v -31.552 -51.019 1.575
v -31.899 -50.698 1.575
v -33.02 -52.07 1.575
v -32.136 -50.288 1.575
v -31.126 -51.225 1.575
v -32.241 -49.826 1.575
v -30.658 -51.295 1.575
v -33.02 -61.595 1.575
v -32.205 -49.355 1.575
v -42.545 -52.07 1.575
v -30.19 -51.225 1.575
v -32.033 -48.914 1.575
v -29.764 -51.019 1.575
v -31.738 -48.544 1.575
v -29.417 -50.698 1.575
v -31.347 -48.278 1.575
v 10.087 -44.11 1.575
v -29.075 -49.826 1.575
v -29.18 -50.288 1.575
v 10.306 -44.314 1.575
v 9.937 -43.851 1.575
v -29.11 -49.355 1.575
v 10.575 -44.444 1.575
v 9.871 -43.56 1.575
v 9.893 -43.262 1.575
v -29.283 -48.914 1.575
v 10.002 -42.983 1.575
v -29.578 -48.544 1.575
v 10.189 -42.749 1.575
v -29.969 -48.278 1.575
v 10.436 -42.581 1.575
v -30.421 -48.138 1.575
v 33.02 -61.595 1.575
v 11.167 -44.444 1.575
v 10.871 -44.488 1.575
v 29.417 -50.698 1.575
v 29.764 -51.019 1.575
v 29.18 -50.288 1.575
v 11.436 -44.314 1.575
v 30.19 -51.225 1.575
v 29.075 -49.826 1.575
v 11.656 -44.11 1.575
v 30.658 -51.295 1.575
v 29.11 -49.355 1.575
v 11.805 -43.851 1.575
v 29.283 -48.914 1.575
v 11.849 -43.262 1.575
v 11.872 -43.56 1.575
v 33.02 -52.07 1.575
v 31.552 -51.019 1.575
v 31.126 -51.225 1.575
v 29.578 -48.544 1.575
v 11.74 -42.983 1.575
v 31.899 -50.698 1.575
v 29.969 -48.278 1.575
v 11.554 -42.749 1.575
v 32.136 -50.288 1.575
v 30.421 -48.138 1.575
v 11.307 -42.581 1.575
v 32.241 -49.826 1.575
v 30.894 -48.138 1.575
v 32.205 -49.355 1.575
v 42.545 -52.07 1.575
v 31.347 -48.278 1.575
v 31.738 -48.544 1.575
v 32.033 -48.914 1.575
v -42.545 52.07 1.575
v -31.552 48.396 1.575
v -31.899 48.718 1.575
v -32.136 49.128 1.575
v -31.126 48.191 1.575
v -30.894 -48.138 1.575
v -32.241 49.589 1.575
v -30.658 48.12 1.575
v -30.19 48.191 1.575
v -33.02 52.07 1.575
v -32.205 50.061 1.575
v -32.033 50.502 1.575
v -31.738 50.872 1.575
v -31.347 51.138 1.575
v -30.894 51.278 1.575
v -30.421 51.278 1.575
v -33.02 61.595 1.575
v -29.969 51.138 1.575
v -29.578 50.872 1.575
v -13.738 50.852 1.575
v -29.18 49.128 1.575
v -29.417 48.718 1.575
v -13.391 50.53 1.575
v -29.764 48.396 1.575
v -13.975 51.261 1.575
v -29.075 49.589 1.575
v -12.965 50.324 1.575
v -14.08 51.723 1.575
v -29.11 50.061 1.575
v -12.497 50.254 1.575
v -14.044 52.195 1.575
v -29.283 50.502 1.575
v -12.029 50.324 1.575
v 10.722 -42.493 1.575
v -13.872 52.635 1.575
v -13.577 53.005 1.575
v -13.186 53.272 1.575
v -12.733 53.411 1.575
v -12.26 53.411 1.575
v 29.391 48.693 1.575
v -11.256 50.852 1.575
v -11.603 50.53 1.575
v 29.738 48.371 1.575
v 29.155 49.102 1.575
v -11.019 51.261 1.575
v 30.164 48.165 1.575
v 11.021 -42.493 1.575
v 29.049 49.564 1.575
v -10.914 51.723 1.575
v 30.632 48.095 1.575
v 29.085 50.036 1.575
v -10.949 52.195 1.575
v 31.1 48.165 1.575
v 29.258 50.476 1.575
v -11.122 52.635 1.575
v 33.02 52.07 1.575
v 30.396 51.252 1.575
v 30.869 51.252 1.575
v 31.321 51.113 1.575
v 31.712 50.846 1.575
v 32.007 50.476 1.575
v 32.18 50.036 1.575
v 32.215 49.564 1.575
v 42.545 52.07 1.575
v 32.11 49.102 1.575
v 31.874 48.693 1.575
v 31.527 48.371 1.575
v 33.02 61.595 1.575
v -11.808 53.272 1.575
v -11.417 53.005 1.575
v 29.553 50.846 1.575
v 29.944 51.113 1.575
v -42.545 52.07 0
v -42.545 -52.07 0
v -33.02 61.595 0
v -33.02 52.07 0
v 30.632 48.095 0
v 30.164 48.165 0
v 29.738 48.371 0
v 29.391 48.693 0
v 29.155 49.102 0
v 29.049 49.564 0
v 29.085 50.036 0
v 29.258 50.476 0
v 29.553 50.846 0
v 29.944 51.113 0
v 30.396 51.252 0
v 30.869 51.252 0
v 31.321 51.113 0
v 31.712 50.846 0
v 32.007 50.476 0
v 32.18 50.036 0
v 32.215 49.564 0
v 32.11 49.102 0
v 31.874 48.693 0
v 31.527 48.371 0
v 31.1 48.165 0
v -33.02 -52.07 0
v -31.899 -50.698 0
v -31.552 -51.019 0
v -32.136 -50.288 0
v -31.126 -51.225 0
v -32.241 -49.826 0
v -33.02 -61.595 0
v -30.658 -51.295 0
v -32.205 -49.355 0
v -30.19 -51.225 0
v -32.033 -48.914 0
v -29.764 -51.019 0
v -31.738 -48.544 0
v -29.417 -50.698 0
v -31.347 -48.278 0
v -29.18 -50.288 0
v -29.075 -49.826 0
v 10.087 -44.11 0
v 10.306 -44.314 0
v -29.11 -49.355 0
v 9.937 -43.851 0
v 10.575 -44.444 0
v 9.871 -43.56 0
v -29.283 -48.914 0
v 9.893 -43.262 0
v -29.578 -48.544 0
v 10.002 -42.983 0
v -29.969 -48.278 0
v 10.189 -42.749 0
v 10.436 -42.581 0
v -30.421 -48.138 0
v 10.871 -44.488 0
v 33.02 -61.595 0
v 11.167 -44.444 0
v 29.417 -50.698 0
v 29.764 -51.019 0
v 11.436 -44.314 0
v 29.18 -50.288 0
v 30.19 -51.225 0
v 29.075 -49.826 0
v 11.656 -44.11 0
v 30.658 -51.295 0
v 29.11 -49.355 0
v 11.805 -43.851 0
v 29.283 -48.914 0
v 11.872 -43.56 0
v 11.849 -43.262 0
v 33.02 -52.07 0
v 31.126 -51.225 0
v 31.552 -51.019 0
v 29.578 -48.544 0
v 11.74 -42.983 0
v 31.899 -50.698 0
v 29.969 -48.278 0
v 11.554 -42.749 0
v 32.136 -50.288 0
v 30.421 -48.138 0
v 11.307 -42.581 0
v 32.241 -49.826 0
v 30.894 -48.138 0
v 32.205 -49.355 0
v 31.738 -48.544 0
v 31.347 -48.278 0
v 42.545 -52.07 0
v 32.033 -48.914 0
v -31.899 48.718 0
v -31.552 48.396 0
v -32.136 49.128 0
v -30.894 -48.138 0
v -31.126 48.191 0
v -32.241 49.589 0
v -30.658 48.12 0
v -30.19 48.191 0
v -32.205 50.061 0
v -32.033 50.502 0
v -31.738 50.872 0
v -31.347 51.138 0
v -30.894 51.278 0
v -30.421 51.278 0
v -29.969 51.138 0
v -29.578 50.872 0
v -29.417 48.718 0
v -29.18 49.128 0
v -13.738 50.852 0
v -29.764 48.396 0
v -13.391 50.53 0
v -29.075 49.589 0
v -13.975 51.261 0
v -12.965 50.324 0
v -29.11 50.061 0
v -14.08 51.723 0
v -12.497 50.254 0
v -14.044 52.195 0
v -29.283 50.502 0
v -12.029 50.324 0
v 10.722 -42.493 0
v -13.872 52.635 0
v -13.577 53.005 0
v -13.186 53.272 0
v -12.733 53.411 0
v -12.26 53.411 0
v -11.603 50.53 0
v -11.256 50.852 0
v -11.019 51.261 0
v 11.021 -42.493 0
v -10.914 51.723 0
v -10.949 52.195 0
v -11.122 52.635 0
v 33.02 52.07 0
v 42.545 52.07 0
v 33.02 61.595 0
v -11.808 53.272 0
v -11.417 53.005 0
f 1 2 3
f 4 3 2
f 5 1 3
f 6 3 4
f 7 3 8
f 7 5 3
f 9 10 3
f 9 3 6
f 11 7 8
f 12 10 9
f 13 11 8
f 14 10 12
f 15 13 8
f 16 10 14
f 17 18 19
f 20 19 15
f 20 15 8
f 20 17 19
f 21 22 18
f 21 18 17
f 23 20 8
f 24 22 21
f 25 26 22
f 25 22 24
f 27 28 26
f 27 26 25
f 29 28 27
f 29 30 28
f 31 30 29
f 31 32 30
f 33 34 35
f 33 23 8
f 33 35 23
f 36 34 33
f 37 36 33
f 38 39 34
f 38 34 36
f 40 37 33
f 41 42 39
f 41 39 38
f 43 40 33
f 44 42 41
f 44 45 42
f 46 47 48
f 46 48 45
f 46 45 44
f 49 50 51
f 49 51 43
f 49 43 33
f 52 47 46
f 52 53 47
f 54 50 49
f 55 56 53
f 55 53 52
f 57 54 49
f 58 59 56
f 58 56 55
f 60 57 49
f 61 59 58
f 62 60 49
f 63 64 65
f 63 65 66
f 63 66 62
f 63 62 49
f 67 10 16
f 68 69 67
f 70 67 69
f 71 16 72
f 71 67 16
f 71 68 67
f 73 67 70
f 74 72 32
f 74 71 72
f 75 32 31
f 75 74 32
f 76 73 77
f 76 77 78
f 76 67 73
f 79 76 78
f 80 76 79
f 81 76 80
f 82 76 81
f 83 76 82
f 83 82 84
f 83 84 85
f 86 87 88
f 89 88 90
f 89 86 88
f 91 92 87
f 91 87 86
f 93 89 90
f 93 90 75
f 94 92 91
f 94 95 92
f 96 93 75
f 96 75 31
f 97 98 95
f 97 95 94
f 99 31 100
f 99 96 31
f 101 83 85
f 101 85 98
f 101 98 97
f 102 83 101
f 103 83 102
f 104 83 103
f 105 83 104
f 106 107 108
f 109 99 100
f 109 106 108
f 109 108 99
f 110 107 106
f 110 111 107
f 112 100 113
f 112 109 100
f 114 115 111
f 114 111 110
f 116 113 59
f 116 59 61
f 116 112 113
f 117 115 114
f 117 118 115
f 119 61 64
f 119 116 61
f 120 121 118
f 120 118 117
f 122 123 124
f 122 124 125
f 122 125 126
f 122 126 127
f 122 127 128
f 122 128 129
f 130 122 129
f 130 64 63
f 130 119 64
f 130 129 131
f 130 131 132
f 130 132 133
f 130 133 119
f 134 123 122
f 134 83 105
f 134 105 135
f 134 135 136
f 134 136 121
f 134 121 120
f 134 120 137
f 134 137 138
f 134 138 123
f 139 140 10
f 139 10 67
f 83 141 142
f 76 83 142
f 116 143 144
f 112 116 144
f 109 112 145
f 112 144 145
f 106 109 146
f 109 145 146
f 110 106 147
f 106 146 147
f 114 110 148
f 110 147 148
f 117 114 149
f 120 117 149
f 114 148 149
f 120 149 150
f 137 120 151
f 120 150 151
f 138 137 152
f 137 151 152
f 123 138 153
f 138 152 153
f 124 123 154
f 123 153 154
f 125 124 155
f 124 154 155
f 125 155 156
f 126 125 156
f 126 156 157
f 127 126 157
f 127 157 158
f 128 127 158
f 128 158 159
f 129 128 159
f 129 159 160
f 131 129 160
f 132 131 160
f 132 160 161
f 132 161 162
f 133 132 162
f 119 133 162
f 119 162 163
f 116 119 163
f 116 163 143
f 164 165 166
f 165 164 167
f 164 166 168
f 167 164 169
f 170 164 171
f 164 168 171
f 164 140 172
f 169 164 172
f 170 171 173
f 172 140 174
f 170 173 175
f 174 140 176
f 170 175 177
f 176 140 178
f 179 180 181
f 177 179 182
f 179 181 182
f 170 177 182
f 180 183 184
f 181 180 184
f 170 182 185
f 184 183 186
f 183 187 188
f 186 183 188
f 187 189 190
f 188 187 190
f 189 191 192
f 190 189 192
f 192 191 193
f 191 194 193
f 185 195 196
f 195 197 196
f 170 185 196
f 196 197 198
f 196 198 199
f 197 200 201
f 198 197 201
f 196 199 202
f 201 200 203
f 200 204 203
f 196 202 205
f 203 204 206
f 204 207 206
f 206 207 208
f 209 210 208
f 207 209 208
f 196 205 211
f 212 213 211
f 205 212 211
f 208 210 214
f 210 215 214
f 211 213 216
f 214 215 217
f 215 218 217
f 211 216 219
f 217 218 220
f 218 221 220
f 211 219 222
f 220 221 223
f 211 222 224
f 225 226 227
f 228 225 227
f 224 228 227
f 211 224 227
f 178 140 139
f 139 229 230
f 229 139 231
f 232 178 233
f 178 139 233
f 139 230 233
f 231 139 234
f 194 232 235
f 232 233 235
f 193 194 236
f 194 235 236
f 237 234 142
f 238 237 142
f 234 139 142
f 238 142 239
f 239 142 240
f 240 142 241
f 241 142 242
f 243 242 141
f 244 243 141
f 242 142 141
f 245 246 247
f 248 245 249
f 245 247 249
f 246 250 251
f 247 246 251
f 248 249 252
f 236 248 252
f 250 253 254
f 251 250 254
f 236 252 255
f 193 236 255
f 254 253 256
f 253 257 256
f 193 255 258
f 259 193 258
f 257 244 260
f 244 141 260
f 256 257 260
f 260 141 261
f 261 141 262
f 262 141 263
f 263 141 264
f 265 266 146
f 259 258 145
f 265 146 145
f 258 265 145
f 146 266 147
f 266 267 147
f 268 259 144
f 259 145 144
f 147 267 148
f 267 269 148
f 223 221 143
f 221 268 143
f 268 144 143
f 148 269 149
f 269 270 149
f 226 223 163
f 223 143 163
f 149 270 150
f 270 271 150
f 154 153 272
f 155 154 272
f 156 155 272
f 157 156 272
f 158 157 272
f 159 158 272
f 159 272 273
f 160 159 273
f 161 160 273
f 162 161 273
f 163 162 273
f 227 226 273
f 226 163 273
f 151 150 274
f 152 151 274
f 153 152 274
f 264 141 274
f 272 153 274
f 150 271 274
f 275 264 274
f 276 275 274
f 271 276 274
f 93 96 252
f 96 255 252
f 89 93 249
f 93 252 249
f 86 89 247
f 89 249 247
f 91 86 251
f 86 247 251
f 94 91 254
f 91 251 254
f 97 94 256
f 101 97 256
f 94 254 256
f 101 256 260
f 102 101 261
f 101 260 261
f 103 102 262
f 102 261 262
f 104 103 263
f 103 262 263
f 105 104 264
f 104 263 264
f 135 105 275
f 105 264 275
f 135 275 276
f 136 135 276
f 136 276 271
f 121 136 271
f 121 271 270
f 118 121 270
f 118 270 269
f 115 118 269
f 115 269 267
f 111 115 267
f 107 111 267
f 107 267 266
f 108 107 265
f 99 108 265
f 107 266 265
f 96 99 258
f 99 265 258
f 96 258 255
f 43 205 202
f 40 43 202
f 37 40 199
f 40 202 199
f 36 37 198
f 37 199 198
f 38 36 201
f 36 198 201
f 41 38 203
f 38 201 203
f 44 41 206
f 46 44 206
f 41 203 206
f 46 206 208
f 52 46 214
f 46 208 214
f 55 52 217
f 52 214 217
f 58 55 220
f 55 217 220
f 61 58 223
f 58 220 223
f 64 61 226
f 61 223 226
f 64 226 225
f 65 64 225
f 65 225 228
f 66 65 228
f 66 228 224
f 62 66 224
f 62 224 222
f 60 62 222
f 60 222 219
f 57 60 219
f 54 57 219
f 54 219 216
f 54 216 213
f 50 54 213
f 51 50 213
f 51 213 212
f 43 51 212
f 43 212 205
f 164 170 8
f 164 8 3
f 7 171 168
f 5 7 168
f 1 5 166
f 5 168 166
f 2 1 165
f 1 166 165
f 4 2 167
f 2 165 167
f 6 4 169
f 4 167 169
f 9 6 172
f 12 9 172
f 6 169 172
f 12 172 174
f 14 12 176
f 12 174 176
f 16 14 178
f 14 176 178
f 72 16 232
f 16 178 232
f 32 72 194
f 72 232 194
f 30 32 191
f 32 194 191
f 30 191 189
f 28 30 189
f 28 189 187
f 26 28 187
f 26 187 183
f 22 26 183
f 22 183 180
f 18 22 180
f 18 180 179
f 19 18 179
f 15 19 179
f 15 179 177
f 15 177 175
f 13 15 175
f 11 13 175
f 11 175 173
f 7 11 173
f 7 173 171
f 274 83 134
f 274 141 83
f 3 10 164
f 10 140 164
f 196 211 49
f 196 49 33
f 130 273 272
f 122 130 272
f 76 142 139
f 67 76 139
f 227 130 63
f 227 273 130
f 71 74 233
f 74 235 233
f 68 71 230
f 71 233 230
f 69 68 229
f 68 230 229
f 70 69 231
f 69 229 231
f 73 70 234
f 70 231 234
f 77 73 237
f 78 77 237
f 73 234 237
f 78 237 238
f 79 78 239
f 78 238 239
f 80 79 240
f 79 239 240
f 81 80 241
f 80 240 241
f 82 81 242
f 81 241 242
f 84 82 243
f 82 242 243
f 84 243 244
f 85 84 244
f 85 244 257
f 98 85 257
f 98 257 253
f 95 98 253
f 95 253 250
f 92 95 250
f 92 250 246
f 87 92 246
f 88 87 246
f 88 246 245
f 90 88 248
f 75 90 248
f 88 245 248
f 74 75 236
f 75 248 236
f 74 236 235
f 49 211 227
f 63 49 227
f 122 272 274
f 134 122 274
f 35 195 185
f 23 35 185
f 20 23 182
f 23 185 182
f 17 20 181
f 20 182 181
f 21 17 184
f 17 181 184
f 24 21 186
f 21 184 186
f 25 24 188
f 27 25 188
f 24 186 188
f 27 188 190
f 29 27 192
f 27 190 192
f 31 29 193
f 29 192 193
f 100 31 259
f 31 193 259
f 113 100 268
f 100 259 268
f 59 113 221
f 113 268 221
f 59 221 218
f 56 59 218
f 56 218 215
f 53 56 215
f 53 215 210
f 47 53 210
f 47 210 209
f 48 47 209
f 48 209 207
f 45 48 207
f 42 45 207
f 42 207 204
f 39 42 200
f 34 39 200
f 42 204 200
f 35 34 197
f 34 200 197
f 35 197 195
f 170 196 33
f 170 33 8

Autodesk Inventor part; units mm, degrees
ref_plane "YZ Plane" through (0, 0, 0) normal (1, 0, 0) x (0, 1, 0)
ref_plane "XZ Plane" through (0, 0, 0) normal (0, 1, 0) x (-1, 0, 0)
ref_plane "XY Plane" through (0, 0, 0) normal (0, 0, 1) x (1, 0, 0)
sketch "Sketch1" plane through (0, 0, 0) normal (0, 0, 1) x (1, 0, 0)
  line L0 (-33.02, 52.07) -> (33.02, 52.07)
  line L1 (33.02, 52.07) -> (33.02, -52.07)
  line L2 (33.02, -52.07) -> (-33.02, -52.07)
  line L3 (-33.02, -52.07) -> (-33.02, 52.07)
  line L4 (-42.545, 61.595) -> (42.545, 61.595)
  line L5 (42.545, 61.595) -> (42.545, -61.595)
  line L6 (42.545, -61.595) -> (-42.545, -61.595)
  line L7 (-42.545, -61.595) -> (-42.545, 61.595)
  line L8 (-33.02, 52.07) -> (33.02, 52.07)
  line L9 (33.02, 52.07) -> (33.02, 61.595)
  line L10 (33.02, 61.595) -> (-33.02, 61.595)
  line L11 (-33.02, 61.595) -> (-33.02, 52.07)
  line L12 (-33.02, 52.07) -> (-42.545, 52.07)
  line L13 (-42.545, 52.07) -> (-42.545, -52.07)
  line L14 (-42.545, -52.07) -> (-33.02, -52.07)
  line L15 (-33.02, -52.07) -> (-33.02, 52.07)
  line L16 (33.02, -52.07) -> (42.545, -52.07)
  line L17 (42.545, -52.07) -> (42.545, 52.07)
  line L18 (42.545, 52.07) -> (33.02, 52.07)
  line L19 (33.02, 52.07) -> (33.02, -52.07)
  line L20 (-33.02, -52.07) -> (33.02, -52.07)
  line L21 (33.02, -52.07) -> (33.02, -61.595)
  line L22 (33.02, -61.595) -> (-33.02, -61.595)
  line L23 (-33.02, -61.595) -> (-33.02, -52.07)
  point P0 (0, 0)
  dimension "d0" = 104.14
  dimension "d1" = 123.19
  dimension "d2" = 66.04
  dimension "d3" = 85.09
  dimension "d4" = 52.07
  dimension "d5" = 33.02
  dimension "d6" = 61.595
  dimension "d7" = 42.545
extrude "Extrusion1" add sketch "Sketch1" along normal blind 1.5748 contours L11 L4 L9 L0 | L0 L1 L2 L3 | L3 L14 L7 L12 | L18 L5 L16 L1 | L2 L21 L6 L23
hole "Hole1" at (30.6324, 49.6824, 1.5748) direction (0, 0, -1) diameter 3.175 end through all
hole "Hole2" at (-30.6578, 49.7078, 1.5748) direction (0, 0, -1) diameter 3.175 end through all
hole "Hole3" at (-30.6578, -49.7078, 1.5748) direction (0, 0, -1) diameter 3.175 end through all
hole "Hole4" at (30.6578, -49.7078, 1.5748) direction (0, 0, -1) diameter 3.175 end through all
hole "Hole5" at (10.8712, -43.4848, 1.5748) direction (0, 0, -1) diameter 2.0066 end through all
hole "Hole6" at (-12.4968, 51.8414, 1.5748) direction (0, 0, -1) diameter 3.175 end through all
equation "\"d4\" = 0.5 * d0"
equation "\"d5\" = 0.5 * d2"
equation "\"d6\" = 0.5 * d1"
equation "\"d7\" = 0.5 * d3"
properties part number "power supply pcb"
